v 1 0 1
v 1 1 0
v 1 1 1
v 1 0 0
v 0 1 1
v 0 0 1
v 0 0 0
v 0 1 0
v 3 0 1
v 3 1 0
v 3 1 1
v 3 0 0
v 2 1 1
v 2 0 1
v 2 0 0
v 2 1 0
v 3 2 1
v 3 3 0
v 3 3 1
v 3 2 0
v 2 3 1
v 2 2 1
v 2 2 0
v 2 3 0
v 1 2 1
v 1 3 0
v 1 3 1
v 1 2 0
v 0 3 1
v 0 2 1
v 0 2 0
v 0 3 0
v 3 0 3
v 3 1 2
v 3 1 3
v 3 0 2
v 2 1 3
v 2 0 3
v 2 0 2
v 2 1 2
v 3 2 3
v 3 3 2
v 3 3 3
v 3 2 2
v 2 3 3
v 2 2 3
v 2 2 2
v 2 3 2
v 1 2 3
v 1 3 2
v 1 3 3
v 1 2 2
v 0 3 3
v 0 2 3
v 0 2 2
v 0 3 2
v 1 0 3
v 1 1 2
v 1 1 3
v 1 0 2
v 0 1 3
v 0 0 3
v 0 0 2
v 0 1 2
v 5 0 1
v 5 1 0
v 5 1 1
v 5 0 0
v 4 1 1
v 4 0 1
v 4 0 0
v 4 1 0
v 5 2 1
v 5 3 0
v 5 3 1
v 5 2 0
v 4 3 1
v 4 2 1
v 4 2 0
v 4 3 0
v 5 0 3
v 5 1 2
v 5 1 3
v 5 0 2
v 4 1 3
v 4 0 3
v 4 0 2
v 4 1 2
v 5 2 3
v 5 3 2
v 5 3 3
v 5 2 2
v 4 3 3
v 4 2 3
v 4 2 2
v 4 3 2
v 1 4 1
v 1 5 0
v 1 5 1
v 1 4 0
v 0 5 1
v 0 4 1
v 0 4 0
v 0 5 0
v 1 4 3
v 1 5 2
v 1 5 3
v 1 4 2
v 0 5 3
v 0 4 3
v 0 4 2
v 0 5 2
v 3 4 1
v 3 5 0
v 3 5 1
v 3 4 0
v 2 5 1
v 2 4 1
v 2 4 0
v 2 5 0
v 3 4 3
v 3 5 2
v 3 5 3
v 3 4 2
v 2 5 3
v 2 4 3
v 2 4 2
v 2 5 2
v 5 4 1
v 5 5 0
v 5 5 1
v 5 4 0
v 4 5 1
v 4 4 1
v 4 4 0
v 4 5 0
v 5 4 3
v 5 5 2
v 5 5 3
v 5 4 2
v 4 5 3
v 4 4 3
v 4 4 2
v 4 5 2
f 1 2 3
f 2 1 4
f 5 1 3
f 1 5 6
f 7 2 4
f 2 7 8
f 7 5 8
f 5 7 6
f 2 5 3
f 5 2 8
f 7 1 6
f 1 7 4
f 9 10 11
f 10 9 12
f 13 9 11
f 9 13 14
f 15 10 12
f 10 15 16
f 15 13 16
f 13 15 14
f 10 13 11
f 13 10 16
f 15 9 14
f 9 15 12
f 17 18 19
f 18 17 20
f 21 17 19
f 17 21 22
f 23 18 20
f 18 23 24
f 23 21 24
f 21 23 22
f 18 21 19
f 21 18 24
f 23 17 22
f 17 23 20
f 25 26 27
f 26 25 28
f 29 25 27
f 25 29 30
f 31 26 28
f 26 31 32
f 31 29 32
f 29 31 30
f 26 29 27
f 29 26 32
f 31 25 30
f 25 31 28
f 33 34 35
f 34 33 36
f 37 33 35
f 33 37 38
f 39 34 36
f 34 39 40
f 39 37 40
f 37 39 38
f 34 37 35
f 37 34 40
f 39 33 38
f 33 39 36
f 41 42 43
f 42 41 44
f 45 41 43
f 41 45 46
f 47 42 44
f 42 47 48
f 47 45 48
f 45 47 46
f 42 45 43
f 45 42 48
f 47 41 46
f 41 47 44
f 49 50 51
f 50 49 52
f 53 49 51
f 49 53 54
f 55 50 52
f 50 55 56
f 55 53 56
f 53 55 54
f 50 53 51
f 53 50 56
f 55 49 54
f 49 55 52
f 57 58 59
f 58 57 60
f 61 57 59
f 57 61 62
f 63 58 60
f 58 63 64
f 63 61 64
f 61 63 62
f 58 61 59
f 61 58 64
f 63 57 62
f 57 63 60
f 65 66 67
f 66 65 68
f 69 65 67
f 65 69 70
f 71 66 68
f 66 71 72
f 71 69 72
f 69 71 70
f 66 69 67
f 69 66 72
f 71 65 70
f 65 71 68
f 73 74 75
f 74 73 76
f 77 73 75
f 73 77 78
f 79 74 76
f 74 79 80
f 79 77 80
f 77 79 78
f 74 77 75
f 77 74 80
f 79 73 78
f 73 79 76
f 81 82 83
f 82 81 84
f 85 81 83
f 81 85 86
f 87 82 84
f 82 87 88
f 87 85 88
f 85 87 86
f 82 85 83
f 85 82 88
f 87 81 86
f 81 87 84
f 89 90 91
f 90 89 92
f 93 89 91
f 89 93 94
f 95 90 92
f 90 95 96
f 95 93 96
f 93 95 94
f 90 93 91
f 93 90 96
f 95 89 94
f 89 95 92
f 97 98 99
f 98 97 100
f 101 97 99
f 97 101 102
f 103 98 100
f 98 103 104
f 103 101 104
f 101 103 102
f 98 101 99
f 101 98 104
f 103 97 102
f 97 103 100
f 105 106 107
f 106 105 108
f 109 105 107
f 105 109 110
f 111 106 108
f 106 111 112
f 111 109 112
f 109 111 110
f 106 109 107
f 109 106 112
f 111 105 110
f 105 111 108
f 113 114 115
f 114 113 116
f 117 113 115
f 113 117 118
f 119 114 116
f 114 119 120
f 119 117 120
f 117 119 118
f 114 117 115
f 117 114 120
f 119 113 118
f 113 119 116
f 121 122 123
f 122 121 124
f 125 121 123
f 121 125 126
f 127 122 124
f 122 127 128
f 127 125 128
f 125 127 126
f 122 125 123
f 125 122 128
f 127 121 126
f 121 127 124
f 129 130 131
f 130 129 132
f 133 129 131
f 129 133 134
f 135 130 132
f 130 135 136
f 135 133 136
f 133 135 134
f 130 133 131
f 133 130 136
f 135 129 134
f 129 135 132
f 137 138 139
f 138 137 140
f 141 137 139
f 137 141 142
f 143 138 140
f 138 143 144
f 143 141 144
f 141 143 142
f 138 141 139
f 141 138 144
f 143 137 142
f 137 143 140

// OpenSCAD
cube();
translate([2, 0, 0]) cube();
translate([2, 2, 0]) cube();
translate([0, 2, 0]) cube();
translate([2, 0, 2]) cube();
translate([2, 2, 2]) cube();
translate([0, 2, 2]) cube();
translate([0, 0, 2]) cube();

translate([4, 0, 0]) cube();
translate([4, 2, 0]) cube();
translate([4, 0, 2]) cube();
translate([4, 2, 2]) cube();

translate([0, 4, 0]) cube();
translate([0, 4, 2]) cube();
translate([2, 4, 0]) cube();
translate([2, 4, 2]) cube();
translate([4, 4, 0]) cube();
translate([4, 4, 2]) cube();
